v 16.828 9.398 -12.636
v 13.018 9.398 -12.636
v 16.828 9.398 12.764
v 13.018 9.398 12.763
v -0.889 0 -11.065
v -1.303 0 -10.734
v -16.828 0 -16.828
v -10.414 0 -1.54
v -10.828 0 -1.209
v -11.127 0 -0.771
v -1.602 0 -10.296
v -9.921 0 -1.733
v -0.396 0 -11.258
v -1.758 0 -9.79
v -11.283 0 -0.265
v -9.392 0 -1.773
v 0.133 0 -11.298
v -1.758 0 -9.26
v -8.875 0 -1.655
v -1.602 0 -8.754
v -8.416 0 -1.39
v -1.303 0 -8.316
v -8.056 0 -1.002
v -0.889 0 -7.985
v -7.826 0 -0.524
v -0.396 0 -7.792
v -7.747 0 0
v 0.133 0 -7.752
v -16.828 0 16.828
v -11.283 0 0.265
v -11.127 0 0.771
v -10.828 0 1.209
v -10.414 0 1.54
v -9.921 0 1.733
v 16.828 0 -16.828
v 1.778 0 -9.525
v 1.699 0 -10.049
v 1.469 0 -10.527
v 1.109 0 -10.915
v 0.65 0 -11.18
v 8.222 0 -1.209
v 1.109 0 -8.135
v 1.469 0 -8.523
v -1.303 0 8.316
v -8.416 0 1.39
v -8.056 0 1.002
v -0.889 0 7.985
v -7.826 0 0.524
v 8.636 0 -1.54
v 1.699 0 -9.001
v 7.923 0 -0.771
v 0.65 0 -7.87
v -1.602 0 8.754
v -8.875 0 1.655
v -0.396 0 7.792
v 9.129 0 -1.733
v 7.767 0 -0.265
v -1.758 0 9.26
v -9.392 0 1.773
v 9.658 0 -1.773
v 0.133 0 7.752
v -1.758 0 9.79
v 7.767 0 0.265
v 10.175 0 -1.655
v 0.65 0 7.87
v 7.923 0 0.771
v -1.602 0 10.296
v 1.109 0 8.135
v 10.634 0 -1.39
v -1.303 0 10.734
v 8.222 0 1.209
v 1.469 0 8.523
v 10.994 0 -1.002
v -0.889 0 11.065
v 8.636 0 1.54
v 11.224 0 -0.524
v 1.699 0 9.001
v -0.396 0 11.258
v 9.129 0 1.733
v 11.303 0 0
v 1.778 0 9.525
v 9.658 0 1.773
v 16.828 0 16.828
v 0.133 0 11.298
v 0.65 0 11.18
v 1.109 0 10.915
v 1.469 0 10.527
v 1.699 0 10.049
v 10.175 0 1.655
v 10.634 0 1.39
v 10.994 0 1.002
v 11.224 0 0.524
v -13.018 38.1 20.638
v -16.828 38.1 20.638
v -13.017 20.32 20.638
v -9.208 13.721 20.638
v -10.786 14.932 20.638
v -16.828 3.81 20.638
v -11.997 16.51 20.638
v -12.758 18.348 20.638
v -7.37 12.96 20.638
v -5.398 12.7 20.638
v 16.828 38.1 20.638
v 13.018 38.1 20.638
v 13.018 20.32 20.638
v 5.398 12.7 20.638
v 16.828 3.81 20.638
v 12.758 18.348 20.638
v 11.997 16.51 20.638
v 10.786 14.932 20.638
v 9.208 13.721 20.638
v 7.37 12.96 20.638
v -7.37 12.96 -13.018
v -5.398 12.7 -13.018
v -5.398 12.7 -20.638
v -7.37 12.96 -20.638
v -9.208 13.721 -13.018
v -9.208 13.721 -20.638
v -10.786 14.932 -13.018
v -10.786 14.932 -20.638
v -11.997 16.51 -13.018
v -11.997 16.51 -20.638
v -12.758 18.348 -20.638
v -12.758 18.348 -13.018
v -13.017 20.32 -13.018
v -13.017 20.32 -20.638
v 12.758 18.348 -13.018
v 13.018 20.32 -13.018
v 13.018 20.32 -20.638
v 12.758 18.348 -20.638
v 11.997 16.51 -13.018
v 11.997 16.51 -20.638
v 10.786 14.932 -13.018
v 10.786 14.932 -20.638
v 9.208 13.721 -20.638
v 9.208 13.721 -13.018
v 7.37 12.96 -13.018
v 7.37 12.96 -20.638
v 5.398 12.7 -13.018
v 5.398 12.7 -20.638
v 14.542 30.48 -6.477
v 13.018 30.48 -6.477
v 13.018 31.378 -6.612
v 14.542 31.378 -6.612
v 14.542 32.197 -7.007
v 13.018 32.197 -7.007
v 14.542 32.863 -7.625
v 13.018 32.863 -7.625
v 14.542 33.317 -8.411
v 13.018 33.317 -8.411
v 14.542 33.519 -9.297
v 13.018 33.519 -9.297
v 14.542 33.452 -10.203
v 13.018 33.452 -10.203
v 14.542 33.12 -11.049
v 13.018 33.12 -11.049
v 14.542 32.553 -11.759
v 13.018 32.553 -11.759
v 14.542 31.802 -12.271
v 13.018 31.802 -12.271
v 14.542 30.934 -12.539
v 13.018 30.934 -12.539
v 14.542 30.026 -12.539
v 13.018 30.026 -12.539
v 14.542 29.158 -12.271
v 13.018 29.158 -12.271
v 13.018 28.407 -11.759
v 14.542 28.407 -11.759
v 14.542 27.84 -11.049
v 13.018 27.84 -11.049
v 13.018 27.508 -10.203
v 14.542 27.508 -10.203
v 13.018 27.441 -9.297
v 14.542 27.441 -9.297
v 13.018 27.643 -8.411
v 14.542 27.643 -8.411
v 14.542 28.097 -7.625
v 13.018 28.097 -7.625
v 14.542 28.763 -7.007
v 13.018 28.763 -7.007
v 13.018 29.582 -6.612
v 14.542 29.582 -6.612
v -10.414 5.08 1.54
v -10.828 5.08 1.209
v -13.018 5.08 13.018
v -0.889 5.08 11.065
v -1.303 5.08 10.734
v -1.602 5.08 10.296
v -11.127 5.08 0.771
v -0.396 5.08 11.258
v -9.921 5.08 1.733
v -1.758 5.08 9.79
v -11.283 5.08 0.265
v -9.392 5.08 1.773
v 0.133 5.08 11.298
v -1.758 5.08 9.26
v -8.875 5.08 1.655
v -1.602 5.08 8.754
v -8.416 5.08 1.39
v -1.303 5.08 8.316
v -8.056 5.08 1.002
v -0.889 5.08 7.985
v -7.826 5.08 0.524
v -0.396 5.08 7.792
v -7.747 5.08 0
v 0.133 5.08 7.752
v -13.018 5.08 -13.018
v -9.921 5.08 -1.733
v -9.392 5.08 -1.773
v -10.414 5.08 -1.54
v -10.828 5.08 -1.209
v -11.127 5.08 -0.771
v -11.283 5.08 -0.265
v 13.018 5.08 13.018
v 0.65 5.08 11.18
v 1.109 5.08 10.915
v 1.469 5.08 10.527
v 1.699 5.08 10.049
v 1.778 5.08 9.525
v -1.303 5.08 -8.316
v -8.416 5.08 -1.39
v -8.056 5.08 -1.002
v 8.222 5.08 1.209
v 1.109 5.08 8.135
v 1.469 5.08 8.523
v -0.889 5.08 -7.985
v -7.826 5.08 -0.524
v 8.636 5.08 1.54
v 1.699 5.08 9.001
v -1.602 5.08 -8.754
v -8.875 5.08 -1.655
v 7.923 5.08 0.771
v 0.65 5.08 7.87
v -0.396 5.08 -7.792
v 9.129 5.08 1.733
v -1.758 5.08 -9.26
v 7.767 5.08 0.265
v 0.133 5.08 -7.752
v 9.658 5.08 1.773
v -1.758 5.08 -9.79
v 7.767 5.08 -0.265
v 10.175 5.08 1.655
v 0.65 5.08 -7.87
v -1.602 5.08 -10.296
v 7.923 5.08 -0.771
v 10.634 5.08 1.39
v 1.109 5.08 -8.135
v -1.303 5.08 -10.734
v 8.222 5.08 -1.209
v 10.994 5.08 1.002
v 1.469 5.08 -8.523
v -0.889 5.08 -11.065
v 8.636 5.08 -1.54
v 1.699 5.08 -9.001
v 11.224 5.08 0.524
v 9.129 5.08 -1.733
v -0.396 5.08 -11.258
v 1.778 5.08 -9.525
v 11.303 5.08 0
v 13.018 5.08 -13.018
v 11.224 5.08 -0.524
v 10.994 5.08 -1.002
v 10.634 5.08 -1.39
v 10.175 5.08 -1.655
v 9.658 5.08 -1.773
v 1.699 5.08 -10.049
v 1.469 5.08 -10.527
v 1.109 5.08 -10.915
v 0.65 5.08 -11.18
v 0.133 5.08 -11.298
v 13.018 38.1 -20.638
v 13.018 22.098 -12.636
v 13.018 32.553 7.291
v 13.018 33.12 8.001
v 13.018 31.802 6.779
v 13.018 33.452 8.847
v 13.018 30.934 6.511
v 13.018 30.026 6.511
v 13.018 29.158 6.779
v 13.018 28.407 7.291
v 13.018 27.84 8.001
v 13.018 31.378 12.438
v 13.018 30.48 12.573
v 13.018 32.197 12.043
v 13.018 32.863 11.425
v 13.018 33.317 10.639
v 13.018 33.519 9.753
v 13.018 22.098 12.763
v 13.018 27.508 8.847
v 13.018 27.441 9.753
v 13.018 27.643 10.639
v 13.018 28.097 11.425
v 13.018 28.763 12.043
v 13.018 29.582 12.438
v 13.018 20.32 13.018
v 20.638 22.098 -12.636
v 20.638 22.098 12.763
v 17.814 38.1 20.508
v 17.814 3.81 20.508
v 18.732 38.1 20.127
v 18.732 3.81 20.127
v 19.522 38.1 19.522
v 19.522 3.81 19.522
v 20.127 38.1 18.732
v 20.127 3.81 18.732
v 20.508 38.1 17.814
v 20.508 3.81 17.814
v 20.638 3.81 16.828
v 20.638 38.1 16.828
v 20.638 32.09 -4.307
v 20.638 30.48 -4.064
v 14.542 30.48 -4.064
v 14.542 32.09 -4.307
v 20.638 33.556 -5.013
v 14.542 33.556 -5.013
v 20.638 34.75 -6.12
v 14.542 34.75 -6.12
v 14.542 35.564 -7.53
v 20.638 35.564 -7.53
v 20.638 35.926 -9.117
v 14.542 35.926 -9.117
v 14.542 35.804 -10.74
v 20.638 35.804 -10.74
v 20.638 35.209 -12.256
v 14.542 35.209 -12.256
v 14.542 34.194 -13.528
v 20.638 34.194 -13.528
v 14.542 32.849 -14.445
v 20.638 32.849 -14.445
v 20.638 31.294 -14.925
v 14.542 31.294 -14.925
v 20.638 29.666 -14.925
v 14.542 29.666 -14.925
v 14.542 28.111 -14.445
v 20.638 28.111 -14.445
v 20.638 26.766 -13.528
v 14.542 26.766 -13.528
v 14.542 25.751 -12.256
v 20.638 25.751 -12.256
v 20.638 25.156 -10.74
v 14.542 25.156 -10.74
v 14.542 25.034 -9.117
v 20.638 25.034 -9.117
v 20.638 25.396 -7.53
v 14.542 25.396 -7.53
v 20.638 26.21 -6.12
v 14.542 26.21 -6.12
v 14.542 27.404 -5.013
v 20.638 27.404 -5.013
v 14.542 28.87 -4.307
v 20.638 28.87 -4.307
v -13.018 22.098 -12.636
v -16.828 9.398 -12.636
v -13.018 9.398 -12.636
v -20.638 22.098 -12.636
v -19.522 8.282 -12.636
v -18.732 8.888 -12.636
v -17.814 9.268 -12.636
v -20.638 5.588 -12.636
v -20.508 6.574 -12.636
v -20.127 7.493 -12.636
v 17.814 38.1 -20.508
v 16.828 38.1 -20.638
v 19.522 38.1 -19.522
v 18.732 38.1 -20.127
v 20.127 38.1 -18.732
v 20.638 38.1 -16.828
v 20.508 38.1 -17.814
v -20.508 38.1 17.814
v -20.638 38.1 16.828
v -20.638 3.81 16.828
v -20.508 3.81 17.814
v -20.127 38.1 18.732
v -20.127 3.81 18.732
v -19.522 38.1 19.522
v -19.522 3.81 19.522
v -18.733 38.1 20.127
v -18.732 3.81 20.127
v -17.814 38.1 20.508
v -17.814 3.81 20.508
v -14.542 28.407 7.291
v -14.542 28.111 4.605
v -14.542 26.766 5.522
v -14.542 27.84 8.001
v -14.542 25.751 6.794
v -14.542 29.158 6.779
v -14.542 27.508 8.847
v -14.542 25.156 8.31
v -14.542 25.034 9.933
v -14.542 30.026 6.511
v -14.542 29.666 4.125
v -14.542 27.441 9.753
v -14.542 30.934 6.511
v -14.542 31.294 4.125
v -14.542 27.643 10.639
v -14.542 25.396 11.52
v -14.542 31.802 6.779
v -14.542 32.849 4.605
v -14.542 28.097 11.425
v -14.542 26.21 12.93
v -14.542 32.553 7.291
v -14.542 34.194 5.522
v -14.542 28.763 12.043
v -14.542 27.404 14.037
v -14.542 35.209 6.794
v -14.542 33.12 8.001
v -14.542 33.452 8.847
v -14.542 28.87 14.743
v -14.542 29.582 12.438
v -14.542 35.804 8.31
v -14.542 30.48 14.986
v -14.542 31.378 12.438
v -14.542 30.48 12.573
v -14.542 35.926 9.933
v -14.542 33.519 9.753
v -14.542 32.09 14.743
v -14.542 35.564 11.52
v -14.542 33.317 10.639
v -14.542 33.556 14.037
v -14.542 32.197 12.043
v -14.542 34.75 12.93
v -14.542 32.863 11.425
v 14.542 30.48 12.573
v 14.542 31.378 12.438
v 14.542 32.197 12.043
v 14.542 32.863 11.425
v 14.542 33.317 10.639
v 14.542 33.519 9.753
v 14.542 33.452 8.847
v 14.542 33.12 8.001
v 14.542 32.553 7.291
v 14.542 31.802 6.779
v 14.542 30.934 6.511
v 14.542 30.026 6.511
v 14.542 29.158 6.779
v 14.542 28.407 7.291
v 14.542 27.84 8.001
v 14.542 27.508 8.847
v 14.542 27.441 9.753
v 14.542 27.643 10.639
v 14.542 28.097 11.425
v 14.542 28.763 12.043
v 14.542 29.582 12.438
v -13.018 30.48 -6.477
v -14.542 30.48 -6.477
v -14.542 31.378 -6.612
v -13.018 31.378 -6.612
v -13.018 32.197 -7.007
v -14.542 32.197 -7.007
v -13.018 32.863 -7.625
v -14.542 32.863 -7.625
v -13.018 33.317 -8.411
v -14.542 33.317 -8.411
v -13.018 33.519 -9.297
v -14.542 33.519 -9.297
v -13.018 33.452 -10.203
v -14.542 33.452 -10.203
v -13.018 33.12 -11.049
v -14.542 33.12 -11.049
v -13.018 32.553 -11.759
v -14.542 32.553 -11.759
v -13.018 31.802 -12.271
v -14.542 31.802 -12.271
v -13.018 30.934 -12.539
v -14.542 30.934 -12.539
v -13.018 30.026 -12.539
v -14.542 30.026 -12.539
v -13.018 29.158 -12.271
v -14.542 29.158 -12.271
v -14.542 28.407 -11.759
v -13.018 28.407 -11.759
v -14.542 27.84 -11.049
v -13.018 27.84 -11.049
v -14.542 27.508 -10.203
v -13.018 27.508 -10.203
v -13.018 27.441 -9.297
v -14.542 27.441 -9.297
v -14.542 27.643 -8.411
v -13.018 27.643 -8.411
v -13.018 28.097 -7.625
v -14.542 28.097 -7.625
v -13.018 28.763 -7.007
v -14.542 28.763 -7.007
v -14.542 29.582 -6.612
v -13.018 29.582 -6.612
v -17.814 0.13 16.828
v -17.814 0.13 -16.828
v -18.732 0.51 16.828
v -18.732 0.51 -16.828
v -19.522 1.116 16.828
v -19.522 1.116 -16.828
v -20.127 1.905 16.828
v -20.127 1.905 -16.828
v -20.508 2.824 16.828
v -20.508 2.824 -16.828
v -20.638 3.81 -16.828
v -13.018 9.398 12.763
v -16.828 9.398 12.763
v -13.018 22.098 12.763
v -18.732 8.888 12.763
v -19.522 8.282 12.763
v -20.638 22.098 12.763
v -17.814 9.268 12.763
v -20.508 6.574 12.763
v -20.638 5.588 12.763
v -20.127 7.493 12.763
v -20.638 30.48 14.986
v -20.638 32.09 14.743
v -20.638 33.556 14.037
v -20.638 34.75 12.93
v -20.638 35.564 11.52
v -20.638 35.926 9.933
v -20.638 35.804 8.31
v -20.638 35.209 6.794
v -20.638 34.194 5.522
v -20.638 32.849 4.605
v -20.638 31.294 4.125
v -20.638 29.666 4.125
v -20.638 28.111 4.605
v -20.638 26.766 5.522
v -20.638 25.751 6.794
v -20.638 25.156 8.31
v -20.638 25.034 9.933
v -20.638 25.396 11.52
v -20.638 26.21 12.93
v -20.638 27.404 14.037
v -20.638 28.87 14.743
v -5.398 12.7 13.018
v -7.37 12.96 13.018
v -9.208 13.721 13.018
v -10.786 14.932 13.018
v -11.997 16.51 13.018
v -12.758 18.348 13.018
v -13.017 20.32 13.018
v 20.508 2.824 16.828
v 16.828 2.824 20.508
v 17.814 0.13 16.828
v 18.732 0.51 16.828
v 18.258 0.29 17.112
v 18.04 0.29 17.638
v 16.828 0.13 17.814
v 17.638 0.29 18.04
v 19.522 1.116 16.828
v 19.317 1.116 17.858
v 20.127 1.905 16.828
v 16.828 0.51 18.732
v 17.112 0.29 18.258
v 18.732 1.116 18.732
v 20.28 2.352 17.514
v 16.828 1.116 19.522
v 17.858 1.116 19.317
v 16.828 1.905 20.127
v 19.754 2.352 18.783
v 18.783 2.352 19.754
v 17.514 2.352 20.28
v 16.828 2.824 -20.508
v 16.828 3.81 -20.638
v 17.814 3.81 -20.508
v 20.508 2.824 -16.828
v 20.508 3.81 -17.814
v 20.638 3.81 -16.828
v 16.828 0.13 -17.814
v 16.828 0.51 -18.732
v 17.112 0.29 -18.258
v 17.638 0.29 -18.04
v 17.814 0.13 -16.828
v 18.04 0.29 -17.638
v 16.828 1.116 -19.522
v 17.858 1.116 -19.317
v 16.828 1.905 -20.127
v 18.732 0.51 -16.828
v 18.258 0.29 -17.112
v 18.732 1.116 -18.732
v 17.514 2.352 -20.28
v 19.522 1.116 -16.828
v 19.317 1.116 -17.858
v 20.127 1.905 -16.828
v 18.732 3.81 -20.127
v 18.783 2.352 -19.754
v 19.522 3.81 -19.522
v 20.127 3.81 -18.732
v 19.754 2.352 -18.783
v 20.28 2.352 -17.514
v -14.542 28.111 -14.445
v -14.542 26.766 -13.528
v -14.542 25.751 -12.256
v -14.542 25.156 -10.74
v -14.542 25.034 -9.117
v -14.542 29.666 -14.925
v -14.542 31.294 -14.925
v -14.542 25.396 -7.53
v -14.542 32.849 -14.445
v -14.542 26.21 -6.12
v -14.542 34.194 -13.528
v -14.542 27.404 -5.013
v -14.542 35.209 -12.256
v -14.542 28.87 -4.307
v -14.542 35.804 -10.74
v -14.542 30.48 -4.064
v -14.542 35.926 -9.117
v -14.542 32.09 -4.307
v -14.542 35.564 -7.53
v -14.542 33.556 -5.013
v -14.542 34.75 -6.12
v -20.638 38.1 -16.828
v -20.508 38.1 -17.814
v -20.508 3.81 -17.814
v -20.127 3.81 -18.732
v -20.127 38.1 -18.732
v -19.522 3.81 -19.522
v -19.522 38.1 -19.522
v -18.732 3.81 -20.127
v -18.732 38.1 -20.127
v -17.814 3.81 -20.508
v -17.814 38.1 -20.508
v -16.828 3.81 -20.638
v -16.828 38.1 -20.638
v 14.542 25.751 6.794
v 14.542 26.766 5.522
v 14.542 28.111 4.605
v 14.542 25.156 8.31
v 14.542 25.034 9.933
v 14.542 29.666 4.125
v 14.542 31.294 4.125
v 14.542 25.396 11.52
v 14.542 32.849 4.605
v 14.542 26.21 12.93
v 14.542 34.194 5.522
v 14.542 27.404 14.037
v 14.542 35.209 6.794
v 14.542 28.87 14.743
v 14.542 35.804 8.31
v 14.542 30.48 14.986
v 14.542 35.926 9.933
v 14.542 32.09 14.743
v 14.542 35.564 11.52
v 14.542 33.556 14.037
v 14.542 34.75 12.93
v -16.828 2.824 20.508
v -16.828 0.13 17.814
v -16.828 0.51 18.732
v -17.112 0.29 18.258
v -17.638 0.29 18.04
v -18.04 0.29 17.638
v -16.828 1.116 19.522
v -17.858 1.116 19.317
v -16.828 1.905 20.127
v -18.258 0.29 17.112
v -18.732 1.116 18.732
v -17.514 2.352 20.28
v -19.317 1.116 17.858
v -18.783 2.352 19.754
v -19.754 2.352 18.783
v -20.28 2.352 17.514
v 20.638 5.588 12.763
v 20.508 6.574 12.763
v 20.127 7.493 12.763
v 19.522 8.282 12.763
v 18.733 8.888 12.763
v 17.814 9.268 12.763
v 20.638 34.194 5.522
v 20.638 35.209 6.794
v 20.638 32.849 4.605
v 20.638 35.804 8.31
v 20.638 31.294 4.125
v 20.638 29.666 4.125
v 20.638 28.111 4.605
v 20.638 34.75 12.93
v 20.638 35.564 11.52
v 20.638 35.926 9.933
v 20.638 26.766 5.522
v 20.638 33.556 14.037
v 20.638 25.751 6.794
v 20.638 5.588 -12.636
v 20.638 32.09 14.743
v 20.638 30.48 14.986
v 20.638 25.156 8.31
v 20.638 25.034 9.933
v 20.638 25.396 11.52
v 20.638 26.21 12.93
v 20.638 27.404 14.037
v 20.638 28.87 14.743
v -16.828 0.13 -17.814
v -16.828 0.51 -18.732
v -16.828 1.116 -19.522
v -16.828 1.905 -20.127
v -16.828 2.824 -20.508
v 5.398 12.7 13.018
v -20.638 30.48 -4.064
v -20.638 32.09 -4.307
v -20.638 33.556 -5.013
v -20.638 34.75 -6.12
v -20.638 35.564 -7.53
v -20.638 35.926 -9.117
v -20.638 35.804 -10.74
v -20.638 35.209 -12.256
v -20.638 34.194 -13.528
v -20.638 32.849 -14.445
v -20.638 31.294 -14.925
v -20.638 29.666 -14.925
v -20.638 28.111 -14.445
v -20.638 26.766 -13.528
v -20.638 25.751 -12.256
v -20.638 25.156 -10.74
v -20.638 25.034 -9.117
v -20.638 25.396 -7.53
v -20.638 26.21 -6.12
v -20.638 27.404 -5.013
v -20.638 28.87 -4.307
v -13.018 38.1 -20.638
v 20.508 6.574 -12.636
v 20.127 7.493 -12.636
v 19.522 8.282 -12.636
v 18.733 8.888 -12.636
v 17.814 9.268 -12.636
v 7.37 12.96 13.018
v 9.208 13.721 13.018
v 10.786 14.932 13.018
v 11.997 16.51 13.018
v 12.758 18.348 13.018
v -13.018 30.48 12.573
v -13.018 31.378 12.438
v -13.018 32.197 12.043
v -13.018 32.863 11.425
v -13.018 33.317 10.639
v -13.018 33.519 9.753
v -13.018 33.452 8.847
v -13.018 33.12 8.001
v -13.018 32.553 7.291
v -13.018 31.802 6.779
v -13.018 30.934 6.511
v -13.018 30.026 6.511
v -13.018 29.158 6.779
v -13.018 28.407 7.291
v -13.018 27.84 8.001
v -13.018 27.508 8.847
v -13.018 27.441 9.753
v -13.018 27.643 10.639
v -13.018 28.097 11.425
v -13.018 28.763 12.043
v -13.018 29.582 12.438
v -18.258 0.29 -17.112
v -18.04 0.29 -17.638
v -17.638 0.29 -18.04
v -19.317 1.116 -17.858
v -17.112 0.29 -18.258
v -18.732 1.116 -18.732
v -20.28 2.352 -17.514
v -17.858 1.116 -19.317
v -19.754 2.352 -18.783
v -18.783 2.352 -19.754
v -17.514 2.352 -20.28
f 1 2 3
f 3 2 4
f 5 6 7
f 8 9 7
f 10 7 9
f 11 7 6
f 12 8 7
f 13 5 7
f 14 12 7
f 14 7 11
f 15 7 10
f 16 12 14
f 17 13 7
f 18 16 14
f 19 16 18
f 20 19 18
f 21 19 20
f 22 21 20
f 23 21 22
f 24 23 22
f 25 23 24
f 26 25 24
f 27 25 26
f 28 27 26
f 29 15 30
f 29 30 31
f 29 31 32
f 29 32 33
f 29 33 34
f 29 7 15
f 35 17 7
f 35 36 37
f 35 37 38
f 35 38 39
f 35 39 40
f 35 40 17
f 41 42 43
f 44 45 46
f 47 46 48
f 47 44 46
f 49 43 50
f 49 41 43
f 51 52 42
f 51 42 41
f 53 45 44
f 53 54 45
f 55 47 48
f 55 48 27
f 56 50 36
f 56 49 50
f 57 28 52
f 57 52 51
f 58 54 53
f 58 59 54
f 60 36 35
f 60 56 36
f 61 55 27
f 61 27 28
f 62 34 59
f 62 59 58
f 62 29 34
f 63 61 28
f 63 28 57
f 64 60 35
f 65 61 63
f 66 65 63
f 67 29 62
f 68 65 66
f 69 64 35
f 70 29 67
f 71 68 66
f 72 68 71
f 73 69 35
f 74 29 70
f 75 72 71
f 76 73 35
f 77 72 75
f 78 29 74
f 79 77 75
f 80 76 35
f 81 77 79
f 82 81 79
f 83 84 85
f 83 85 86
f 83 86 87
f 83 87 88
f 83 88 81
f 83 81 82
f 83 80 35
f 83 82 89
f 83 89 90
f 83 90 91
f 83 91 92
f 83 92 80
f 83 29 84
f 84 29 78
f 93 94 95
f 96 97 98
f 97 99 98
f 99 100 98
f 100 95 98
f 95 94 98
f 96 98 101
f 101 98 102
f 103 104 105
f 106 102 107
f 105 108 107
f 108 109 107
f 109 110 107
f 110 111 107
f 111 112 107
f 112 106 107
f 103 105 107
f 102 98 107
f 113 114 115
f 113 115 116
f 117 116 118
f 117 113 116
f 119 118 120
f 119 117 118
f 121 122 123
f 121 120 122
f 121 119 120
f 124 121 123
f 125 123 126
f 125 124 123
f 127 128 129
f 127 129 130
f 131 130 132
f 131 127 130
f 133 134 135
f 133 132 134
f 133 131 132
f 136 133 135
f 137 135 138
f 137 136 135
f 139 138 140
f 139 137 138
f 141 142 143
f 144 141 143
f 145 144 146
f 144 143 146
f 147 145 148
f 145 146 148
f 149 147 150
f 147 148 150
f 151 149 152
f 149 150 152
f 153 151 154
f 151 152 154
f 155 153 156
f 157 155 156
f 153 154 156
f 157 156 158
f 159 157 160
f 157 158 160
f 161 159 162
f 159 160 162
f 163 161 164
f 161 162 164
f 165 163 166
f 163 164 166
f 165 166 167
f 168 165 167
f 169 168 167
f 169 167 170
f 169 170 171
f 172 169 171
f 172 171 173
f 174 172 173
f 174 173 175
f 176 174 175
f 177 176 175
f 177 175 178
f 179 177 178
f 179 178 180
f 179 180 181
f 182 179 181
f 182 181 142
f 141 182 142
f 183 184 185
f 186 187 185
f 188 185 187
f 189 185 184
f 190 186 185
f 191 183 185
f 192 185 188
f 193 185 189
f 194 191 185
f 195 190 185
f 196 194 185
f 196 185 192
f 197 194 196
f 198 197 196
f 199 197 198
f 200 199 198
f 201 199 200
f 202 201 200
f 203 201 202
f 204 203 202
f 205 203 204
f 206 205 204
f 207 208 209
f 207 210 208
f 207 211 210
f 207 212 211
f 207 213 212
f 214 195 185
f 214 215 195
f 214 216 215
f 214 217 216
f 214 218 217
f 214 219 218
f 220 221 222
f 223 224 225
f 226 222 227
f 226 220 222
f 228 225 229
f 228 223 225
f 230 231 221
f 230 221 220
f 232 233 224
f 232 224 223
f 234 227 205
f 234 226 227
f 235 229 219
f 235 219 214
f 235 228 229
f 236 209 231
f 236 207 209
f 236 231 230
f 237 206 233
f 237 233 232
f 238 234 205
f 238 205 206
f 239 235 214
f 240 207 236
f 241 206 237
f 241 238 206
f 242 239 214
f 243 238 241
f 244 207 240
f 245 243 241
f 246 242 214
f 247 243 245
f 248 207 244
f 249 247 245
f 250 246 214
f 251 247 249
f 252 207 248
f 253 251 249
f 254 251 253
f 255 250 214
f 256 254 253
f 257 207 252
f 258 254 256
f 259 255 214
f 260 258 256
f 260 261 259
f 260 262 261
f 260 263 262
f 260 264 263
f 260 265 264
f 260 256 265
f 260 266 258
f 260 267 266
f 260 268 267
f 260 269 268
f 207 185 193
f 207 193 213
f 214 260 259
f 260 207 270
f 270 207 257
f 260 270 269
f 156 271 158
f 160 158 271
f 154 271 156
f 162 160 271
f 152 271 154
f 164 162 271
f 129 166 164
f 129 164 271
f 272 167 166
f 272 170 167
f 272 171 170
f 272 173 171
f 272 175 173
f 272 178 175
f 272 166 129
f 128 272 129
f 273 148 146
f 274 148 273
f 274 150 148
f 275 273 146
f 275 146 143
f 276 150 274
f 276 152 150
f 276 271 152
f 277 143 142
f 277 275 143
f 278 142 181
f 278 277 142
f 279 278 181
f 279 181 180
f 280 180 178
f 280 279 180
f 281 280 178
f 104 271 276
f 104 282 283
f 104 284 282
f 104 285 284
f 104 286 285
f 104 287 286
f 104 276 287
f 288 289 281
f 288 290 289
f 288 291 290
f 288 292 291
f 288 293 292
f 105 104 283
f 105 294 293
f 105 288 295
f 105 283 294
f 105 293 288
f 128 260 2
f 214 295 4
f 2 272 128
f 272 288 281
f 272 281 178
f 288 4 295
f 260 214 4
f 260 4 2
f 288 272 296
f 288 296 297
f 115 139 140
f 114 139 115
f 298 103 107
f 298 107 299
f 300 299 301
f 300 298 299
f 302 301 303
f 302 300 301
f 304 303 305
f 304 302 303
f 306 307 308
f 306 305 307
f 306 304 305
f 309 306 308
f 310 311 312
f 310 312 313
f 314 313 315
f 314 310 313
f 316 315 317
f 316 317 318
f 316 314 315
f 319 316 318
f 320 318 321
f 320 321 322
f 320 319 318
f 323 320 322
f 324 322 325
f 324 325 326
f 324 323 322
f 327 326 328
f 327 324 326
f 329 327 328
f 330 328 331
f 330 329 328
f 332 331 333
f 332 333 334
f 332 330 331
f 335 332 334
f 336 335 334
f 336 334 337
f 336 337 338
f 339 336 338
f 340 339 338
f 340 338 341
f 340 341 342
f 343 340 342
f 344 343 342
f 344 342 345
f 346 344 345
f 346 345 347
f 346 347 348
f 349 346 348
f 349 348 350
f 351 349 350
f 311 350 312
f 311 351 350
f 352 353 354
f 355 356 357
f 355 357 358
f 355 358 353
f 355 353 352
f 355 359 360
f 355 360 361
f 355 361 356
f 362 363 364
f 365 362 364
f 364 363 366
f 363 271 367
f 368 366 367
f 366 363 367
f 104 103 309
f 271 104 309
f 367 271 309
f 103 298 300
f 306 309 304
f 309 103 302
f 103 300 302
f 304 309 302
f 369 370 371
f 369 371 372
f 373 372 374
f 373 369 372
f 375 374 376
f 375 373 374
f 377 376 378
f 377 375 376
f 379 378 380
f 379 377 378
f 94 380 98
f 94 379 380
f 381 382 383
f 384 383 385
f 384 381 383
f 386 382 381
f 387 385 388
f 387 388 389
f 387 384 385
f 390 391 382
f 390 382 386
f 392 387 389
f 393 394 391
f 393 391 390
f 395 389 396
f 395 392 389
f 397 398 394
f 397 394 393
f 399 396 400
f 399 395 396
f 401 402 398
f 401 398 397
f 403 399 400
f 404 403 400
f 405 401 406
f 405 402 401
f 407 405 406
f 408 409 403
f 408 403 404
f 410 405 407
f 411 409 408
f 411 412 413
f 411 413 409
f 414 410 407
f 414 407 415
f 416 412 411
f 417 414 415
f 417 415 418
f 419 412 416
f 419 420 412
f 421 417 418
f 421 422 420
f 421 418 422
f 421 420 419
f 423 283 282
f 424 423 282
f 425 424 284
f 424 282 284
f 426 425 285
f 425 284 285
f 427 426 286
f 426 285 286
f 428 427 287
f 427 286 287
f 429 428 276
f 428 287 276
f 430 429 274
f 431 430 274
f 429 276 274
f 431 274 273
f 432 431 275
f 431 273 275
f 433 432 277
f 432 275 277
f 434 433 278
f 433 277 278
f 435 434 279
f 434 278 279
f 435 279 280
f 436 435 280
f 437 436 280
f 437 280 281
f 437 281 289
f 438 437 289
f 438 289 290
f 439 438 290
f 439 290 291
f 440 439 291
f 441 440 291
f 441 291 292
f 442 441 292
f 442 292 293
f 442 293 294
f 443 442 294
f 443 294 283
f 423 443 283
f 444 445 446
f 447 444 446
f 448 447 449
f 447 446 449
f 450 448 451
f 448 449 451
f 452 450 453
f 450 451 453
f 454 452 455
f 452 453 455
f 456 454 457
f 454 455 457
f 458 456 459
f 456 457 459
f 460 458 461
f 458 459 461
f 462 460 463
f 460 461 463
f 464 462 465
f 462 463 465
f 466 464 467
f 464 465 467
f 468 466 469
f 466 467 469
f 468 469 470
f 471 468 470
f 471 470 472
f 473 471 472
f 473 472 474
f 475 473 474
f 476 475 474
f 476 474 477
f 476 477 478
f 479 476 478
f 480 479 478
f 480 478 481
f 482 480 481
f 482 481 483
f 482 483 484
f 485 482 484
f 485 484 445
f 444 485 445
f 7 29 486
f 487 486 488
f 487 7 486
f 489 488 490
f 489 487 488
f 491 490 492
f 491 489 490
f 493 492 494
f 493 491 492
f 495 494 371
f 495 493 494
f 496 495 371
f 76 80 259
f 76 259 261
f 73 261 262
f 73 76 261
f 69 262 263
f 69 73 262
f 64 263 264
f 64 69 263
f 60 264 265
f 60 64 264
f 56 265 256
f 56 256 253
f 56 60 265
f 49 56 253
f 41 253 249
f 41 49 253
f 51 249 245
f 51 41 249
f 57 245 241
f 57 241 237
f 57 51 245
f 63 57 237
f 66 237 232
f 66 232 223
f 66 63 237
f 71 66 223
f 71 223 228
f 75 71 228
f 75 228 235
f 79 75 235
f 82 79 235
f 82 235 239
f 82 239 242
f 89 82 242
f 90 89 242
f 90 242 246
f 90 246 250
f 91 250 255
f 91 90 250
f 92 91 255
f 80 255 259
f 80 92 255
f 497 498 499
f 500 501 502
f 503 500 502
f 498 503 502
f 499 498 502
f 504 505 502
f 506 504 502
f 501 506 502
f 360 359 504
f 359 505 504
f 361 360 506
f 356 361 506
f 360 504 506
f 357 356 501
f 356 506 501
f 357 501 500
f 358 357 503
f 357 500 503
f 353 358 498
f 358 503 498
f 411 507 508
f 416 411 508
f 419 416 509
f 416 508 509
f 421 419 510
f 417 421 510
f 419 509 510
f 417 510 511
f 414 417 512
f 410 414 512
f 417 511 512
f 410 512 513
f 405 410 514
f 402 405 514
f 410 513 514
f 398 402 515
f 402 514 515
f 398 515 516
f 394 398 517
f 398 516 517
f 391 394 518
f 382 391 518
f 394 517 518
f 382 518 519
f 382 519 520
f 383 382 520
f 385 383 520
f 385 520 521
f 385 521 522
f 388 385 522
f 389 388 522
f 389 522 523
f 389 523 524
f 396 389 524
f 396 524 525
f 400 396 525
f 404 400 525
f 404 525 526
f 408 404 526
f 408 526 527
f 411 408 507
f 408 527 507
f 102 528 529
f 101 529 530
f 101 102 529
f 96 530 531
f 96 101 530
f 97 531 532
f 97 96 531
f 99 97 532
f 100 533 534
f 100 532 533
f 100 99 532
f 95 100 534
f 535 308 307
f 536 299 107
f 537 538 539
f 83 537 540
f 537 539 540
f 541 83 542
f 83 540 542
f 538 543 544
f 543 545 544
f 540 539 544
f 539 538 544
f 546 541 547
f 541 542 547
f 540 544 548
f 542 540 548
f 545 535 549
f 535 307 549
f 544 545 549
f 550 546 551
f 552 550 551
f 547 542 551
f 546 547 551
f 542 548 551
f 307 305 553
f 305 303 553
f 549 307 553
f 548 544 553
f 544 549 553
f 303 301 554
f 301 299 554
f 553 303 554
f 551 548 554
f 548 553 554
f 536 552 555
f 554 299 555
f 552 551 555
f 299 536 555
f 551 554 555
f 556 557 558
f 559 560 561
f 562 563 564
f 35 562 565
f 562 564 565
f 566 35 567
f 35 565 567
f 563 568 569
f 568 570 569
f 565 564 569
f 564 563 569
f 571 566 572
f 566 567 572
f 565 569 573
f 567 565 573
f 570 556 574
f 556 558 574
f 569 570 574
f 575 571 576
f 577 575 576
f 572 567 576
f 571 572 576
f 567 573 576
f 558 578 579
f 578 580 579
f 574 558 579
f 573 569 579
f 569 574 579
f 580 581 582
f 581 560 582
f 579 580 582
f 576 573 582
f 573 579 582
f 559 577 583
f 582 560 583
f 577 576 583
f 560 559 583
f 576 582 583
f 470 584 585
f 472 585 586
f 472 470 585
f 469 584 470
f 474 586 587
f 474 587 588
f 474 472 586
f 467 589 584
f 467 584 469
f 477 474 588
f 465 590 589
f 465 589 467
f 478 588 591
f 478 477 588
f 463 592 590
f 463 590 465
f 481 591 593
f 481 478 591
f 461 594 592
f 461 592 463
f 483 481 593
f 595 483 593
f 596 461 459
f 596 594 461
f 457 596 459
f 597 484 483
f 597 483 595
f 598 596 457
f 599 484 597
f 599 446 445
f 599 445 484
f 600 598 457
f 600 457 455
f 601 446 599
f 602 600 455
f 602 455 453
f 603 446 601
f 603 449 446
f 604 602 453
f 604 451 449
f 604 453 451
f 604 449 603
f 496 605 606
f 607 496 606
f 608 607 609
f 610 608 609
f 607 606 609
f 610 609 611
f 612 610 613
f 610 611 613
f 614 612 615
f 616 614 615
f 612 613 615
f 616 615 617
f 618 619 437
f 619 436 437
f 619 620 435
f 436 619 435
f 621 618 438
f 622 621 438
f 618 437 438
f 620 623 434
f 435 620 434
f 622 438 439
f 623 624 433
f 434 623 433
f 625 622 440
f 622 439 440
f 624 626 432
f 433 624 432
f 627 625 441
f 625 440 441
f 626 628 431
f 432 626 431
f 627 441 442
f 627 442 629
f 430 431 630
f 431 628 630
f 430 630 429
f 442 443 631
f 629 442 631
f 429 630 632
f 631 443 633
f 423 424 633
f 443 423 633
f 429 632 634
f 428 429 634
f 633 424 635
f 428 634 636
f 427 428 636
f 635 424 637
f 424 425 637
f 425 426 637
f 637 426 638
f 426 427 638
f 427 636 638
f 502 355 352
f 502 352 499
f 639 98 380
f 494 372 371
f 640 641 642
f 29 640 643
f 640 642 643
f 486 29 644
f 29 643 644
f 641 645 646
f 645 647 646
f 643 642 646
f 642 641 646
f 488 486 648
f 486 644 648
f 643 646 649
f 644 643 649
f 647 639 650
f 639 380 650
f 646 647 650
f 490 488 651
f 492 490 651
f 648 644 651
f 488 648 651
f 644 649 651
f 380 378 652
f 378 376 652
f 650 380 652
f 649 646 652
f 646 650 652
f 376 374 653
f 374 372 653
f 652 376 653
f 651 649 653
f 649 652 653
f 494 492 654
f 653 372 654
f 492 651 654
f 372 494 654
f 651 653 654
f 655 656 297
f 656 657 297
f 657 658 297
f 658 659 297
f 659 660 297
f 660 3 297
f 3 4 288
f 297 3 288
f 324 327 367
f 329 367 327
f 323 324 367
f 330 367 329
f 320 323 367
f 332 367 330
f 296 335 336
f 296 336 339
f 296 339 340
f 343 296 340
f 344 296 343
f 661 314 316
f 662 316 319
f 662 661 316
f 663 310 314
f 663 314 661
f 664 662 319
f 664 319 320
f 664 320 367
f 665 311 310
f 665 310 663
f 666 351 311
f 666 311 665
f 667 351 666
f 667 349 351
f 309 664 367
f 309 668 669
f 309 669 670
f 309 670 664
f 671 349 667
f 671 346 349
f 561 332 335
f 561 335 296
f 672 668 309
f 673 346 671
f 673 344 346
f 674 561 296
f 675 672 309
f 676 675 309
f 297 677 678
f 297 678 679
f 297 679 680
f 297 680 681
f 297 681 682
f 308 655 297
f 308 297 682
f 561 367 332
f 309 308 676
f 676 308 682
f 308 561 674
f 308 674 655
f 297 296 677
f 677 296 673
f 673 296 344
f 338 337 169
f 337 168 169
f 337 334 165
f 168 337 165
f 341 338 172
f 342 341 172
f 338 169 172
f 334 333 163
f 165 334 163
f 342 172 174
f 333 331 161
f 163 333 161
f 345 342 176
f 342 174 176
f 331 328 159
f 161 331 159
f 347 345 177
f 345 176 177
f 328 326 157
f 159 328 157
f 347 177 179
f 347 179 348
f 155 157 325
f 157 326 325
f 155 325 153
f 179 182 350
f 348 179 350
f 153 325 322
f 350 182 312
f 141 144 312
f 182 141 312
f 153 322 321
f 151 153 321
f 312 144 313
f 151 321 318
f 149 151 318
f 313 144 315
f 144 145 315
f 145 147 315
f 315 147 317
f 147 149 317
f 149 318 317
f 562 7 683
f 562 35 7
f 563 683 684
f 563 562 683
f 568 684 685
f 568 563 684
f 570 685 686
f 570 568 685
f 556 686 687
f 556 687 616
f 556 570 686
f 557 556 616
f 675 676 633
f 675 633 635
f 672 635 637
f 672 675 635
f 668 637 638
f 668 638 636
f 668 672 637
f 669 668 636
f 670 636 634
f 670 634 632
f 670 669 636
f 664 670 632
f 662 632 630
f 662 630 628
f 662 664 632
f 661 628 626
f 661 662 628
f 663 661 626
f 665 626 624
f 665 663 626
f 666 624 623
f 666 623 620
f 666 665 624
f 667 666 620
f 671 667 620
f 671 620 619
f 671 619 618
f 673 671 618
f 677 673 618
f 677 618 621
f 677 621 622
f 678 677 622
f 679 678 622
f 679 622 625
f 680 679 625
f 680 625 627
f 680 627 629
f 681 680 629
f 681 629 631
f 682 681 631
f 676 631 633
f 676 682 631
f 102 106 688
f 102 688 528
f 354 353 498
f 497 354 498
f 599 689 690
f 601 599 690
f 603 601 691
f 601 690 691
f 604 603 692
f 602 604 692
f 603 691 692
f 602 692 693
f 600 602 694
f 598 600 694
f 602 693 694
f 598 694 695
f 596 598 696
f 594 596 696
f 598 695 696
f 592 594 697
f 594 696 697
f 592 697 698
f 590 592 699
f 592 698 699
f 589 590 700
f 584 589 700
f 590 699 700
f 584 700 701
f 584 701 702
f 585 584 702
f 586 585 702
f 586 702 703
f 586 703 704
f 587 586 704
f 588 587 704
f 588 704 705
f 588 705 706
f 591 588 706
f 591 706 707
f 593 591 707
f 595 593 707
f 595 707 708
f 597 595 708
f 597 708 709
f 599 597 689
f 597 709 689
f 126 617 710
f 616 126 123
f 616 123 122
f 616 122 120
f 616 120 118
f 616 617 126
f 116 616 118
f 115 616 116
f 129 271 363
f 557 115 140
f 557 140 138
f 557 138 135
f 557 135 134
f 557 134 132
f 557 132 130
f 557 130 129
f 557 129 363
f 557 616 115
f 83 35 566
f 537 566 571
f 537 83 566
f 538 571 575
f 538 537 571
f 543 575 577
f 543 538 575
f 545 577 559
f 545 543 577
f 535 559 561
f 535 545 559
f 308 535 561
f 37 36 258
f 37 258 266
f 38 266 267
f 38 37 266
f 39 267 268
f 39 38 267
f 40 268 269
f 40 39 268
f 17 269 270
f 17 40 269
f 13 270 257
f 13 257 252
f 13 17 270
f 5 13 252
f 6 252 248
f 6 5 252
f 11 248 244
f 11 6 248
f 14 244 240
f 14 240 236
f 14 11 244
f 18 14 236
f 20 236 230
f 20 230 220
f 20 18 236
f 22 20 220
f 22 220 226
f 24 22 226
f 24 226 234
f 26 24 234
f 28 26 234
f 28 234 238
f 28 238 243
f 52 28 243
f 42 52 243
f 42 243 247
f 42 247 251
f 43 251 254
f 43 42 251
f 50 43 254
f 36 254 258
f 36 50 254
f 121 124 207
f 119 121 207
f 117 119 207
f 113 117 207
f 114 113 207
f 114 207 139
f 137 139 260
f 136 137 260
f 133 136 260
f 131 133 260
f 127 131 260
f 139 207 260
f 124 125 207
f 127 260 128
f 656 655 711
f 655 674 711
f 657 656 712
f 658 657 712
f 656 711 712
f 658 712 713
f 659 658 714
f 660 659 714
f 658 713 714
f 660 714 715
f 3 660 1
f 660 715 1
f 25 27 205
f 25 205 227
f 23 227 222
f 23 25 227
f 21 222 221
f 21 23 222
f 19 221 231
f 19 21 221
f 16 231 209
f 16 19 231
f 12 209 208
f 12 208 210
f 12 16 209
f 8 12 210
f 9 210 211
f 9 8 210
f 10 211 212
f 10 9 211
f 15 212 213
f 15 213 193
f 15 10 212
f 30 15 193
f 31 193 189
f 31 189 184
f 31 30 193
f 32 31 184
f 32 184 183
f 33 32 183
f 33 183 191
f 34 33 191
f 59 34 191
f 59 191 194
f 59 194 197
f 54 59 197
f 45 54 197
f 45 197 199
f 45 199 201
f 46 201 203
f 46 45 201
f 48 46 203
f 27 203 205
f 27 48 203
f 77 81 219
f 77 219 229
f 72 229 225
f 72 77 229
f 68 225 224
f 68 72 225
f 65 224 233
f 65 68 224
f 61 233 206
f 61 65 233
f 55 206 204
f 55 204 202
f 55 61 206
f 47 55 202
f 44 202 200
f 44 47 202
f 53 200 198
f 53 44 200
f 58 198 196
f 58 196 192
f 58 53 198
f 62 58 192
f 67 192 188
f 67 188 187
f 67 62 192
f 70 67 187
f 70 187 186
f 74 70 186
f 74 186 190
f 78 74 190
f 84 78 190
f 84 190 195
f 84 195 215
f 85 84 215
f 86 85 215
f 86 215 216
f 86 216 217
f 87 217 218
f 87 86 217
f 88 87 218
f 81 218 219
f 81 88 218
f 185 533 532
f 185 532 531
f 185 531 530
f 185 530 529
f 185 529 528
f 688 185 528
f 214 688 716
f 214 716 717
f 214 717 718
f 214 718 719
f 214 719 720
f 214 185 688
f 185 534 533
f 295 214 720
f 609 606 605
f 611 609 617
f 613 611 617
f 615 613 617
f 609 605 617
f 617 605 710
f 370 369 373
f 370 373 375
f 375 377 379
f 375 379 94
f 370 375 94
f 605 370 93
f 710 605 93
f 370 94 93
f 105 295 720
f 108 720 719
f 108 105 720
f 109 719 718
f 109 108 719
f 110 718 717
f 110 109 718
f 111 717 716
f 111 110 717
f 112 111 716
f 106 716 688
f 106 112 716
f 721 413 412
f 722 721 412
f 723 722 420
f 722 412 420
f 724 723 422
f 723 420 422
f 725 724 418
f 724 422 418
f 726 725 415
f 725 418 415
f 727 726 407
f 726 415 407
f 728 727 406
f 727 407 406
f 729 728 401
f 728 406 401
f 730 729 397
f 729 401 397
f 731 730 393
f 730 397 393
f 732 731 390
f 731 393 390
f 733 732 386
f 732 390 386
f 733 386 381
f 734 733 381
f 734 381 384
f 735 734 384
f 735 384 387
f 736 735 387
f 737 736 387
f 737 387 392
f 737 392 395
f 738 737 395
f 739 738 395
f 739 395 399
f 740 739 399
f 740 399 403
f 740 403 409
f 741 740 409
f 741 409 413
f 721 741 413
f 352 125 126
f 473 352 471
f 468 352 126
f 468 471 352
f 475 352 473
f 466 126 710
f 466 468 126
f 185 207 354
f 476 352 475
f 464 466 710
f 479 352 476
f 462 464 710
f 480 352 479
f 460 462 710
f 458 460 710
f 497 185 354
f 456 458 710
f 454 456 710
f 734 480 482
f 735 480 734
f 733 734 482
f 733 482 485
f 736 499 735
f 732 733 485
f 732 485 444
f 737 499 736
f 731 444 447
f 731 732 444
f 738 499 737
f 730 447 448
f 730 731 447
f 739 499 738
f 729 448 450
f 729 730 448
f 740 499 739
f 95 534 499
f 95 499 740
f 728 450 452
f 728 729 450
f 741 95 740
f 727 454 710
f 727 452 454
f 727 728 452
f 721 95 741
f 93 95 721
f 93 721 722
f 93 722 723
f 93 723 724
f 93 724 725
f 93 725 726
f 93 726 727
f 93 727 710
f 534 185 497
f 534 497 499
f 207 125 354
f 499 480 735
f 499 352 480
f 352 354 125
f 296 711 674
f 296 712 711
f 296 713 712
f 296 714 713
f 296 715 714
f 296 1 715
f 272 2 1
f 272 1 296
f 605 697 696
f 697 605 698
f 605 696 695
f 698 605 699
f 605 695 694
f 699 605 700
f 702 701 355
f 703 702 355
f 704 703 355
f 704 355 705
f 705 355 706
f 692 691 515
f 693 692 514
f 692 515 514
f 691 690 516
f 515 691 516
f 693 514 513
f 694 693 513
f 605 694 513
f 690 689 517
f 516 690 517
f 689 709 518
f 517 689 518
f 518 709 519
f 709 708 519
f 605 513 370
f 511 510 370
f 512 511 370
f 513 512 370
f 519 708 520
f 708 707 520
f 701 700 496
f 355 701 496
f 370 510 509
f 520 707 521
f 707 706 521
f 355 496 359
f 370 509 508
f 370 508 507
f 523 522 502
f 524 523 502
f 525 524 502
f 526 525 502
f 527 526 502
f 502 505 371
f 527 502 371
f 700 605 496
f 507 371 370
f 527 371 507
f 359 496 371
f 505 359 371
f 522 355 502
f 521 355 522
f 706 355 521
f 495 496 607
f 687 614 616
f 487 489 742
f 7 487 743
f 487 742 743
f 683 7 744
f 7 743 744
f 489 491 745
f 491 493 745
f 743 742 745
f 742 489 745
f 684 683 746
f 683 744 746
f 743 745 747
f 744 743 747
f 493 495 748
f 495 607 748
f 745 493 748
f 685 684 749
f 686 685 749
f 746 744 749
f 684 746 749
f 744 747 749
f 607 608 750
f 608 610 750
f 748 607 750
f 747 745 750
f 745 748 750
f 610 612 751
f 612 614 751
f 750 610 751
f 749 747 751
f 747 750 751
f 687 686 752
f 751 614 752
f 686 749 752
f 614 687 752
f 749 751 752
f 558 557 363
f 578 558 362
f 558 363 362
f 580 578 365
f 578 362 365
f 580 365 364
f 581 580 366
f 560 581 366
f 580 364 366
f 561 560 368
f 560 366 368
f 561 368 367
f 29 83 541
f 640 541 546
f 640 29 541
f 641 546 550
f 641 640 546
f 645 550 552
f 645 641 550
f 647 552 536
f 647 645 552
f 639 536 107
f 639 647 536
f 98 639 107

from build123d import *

# Parameters (mm, degrees)
SKETCH1_W           = 26.035
SKETCH1_H           = 26.035
SKETCH1_R           = 1.778
BOSS_EXTRUDE1_DEPTH = 5.08
SKETCH9_W           = 41.275
SKETCH9_H           = 41.275
SKETCH9_W_2         = 26.035
SKETCH9_H_2         = 26.035
BOSS_EXTRUDE7_DEPTH = 38.1
CUT_EXTRUDE4_DEPTH  = 42.275
SKETCH11_R          = 3.048
CUT_EXTRUDE5_DEPTH  = 42.275
FILLET1_R           = 3.81
FILLET2_R           = 3.81
SKETCH12_R          = 5.461
SKETCH12_R_2        = 3.048
CUT_EXTRUDE6_DEPTH  = 6.096
CUT_EXTRUDE7_START  = -41.275
SKETCH12_3_R        = 5.461
CUT_EXTRUDE7_DEPTH  = 6.096
SKETCH13_W          = 25.4
SKETCH13_H          = 12.7
CUT_EXTRUDE8_DEPTH  = 42.275
FILLET3_R           = 3.81
FILLET4_R           = 3.81


with BuildPart() as part:
    # Sketch1 → Boss-Extrude1 (new body)
    with BuildSketch(Plane(origin=(0, 0, 0), x_dir=(1, 0, 0), z_dir=(0, 1, 0))):
        Rectangle(SKETCH1_W, SKETCH1_H)
        with Locations((0, 9.525)):
            Circle(SKETCH1_R, mode=Mode.SUBTRACT)
        with Locations((-9.525, 0)):
            Circle(SKETCH1_R, mode=Mode.SUBTRACT)
        with Locations((9.525, 0)):
            Circle(SKETCH1_R, mode=Mode.SUBTRACT)
        with Locations((0, -9.525)):
            Circle(SKETCH1_R, mode=Mode.SUBTRACT)
    extrude(amount=BOSS_EXTRUDE1_DEPTH)

    # Sketch9 → Boss-Extrude7 (add)
    with BuildSketch(Plane.XZ):
        Rectangle(SKETCH9_W, SKETCH9_H)
        Rectangle(SKETCH9_W_2, SKETCH9_H_2, mode=Mode.SUBTRACT)
    extrude(amount=-BOSS_EXTRUDE7_DEPTH)

    # Sketch10 → Cut-Extrude4 (cut, through all)
    with BuildSketch(Plane.XY.offset(20.6375)):
        with BuildLine():
            Line((-13.0175, 20.32), (-13.0175, 38.1))
            Line((-13.0175, 38.1), (13.0175, 38.1))
            Line((13.0175, 38.1), (13.0175, 20.32))
            ThreePointArc((13.0175, 20.32), (10.785653673, 14.931846327), (5.3975, 12.7))
            Line((5.3975, 12.7), (-5.3975, 12.7))
            ThreePointArc((-5.3975, 12.7), (-10.785653673, 14.931846327), (-13.0175, 20.32))
        make_face()
    extrude(amount=-CUT_EXTRUDE4_DEPTH, mode=Mode.SUBTRACT)

    # Sketch11 → Cut-Extrude5 (cut, through all)
    with BuildSketch(Plane.ZY.offset(20.6375)):
        with Locations((-9.525, 30.48)):
            Circle(SKETCH11_R)
        with Locations((9.525, 30.48)):
            Circle(SKETCH11_R)
    extrude(amount=-CUT_EXTRUDE5_DEPTH, mode=Mode.SUBTRACT)

    # Fillet1
    fillet1_edges = [part.edges().sort_by_distance(p)[0] for p in [
        (20.6375, 19.05, -20.6375),
        (-20.6375, 19.05, -20.6375),
        (-20.6375, 19.05, 20.6375),
        (20.6375, 19.05, 20.6375),
    ]]
    fillet(fillet1_edges, radius=FILLET1_R)

    # Fillet2
    fillet2_edges = [part.edges().sort_by_distance(p)[0] for p in [
        (0, 0, -20.6375),
        (20.6375, 0, 0),
        (0, 0, 20.6375),
        (-20.6375, 0, 0),
        (-19.521576836, 0, 19.521576836),
        (-19.521576836, 0, -19.521576836),
        (19.521576836, 0, 19.521576836),
        (19.521576836, 0, -19.521576836),
    ]]
    fillet(fillet2_edges, radius=FILLET2_R)

    # Sketch12 → Cut-Extrude6 (cut)
    with BuildSketch(Plane.ZY.offset(20.6375)):
        with Locations((-9.525, 30.48)):
            Circle(SKETCH12_R)
        with Locations((-9.525, 30.48)):
            Circle(SKETCH12_R_2, mode=Mode.SUBTRACT)
        with Locations((9.525, 30.48)):
            Circle(SKETCH12_R)
        with Locations((9.525, 30.48)):
            Circle(SKETCH12_R_2, mode=Mode.SUBTRACT)
    extrude(amount=-CUT_EXTRUDE6_DEPTH, mode=Mode.SUBTRACT)

    # Sketch12<3> → Cut-Extrude7 (cut)
    with BuildSketch(Plane.ZY.offset(20.6375).offset(CUT_EXTRUDE7_START)):
        with Locations((-9.525, 30.48)):
            Circle(SKETCH12_3_R)
        with Locations((9.525, 30.48)):
            Circle(SKETCH12_3_R)
    extrude(amount=CUT_EXTRUDE7_DEPTH, mode=Mode.SUBTRACT)

    # Sketch13 → Cut-Extrude8 (cut, through all)
    with BuildSketch(Plane.ZY.offset(20.6375)):
        with Locations((0.0635, 15.748)):
            Rectangle(SKETCH13_W, SKETCH13_H)
    extrude(amount=-CUT_EXTRUDE8_DEPTH, mode=Mode.SUBTRACT)

    # Fillet3
    fillet3_edges = [part.edges().sort_by_distance(p)[0] for p in [
        (-20.6375, 9.398, 0.0635),
    ]]
    fillet(fillet3_edges, radius=FILLET3_R)

    # Fillet4
    fillet4_edges = [part.edges().sort_by_distance(p)[0] for p in [
        (20.6375, 9.398, 0.0635),
    ]]
    fillet(fillet4_edges, radius=FILLET4_R)


solid = part.part
